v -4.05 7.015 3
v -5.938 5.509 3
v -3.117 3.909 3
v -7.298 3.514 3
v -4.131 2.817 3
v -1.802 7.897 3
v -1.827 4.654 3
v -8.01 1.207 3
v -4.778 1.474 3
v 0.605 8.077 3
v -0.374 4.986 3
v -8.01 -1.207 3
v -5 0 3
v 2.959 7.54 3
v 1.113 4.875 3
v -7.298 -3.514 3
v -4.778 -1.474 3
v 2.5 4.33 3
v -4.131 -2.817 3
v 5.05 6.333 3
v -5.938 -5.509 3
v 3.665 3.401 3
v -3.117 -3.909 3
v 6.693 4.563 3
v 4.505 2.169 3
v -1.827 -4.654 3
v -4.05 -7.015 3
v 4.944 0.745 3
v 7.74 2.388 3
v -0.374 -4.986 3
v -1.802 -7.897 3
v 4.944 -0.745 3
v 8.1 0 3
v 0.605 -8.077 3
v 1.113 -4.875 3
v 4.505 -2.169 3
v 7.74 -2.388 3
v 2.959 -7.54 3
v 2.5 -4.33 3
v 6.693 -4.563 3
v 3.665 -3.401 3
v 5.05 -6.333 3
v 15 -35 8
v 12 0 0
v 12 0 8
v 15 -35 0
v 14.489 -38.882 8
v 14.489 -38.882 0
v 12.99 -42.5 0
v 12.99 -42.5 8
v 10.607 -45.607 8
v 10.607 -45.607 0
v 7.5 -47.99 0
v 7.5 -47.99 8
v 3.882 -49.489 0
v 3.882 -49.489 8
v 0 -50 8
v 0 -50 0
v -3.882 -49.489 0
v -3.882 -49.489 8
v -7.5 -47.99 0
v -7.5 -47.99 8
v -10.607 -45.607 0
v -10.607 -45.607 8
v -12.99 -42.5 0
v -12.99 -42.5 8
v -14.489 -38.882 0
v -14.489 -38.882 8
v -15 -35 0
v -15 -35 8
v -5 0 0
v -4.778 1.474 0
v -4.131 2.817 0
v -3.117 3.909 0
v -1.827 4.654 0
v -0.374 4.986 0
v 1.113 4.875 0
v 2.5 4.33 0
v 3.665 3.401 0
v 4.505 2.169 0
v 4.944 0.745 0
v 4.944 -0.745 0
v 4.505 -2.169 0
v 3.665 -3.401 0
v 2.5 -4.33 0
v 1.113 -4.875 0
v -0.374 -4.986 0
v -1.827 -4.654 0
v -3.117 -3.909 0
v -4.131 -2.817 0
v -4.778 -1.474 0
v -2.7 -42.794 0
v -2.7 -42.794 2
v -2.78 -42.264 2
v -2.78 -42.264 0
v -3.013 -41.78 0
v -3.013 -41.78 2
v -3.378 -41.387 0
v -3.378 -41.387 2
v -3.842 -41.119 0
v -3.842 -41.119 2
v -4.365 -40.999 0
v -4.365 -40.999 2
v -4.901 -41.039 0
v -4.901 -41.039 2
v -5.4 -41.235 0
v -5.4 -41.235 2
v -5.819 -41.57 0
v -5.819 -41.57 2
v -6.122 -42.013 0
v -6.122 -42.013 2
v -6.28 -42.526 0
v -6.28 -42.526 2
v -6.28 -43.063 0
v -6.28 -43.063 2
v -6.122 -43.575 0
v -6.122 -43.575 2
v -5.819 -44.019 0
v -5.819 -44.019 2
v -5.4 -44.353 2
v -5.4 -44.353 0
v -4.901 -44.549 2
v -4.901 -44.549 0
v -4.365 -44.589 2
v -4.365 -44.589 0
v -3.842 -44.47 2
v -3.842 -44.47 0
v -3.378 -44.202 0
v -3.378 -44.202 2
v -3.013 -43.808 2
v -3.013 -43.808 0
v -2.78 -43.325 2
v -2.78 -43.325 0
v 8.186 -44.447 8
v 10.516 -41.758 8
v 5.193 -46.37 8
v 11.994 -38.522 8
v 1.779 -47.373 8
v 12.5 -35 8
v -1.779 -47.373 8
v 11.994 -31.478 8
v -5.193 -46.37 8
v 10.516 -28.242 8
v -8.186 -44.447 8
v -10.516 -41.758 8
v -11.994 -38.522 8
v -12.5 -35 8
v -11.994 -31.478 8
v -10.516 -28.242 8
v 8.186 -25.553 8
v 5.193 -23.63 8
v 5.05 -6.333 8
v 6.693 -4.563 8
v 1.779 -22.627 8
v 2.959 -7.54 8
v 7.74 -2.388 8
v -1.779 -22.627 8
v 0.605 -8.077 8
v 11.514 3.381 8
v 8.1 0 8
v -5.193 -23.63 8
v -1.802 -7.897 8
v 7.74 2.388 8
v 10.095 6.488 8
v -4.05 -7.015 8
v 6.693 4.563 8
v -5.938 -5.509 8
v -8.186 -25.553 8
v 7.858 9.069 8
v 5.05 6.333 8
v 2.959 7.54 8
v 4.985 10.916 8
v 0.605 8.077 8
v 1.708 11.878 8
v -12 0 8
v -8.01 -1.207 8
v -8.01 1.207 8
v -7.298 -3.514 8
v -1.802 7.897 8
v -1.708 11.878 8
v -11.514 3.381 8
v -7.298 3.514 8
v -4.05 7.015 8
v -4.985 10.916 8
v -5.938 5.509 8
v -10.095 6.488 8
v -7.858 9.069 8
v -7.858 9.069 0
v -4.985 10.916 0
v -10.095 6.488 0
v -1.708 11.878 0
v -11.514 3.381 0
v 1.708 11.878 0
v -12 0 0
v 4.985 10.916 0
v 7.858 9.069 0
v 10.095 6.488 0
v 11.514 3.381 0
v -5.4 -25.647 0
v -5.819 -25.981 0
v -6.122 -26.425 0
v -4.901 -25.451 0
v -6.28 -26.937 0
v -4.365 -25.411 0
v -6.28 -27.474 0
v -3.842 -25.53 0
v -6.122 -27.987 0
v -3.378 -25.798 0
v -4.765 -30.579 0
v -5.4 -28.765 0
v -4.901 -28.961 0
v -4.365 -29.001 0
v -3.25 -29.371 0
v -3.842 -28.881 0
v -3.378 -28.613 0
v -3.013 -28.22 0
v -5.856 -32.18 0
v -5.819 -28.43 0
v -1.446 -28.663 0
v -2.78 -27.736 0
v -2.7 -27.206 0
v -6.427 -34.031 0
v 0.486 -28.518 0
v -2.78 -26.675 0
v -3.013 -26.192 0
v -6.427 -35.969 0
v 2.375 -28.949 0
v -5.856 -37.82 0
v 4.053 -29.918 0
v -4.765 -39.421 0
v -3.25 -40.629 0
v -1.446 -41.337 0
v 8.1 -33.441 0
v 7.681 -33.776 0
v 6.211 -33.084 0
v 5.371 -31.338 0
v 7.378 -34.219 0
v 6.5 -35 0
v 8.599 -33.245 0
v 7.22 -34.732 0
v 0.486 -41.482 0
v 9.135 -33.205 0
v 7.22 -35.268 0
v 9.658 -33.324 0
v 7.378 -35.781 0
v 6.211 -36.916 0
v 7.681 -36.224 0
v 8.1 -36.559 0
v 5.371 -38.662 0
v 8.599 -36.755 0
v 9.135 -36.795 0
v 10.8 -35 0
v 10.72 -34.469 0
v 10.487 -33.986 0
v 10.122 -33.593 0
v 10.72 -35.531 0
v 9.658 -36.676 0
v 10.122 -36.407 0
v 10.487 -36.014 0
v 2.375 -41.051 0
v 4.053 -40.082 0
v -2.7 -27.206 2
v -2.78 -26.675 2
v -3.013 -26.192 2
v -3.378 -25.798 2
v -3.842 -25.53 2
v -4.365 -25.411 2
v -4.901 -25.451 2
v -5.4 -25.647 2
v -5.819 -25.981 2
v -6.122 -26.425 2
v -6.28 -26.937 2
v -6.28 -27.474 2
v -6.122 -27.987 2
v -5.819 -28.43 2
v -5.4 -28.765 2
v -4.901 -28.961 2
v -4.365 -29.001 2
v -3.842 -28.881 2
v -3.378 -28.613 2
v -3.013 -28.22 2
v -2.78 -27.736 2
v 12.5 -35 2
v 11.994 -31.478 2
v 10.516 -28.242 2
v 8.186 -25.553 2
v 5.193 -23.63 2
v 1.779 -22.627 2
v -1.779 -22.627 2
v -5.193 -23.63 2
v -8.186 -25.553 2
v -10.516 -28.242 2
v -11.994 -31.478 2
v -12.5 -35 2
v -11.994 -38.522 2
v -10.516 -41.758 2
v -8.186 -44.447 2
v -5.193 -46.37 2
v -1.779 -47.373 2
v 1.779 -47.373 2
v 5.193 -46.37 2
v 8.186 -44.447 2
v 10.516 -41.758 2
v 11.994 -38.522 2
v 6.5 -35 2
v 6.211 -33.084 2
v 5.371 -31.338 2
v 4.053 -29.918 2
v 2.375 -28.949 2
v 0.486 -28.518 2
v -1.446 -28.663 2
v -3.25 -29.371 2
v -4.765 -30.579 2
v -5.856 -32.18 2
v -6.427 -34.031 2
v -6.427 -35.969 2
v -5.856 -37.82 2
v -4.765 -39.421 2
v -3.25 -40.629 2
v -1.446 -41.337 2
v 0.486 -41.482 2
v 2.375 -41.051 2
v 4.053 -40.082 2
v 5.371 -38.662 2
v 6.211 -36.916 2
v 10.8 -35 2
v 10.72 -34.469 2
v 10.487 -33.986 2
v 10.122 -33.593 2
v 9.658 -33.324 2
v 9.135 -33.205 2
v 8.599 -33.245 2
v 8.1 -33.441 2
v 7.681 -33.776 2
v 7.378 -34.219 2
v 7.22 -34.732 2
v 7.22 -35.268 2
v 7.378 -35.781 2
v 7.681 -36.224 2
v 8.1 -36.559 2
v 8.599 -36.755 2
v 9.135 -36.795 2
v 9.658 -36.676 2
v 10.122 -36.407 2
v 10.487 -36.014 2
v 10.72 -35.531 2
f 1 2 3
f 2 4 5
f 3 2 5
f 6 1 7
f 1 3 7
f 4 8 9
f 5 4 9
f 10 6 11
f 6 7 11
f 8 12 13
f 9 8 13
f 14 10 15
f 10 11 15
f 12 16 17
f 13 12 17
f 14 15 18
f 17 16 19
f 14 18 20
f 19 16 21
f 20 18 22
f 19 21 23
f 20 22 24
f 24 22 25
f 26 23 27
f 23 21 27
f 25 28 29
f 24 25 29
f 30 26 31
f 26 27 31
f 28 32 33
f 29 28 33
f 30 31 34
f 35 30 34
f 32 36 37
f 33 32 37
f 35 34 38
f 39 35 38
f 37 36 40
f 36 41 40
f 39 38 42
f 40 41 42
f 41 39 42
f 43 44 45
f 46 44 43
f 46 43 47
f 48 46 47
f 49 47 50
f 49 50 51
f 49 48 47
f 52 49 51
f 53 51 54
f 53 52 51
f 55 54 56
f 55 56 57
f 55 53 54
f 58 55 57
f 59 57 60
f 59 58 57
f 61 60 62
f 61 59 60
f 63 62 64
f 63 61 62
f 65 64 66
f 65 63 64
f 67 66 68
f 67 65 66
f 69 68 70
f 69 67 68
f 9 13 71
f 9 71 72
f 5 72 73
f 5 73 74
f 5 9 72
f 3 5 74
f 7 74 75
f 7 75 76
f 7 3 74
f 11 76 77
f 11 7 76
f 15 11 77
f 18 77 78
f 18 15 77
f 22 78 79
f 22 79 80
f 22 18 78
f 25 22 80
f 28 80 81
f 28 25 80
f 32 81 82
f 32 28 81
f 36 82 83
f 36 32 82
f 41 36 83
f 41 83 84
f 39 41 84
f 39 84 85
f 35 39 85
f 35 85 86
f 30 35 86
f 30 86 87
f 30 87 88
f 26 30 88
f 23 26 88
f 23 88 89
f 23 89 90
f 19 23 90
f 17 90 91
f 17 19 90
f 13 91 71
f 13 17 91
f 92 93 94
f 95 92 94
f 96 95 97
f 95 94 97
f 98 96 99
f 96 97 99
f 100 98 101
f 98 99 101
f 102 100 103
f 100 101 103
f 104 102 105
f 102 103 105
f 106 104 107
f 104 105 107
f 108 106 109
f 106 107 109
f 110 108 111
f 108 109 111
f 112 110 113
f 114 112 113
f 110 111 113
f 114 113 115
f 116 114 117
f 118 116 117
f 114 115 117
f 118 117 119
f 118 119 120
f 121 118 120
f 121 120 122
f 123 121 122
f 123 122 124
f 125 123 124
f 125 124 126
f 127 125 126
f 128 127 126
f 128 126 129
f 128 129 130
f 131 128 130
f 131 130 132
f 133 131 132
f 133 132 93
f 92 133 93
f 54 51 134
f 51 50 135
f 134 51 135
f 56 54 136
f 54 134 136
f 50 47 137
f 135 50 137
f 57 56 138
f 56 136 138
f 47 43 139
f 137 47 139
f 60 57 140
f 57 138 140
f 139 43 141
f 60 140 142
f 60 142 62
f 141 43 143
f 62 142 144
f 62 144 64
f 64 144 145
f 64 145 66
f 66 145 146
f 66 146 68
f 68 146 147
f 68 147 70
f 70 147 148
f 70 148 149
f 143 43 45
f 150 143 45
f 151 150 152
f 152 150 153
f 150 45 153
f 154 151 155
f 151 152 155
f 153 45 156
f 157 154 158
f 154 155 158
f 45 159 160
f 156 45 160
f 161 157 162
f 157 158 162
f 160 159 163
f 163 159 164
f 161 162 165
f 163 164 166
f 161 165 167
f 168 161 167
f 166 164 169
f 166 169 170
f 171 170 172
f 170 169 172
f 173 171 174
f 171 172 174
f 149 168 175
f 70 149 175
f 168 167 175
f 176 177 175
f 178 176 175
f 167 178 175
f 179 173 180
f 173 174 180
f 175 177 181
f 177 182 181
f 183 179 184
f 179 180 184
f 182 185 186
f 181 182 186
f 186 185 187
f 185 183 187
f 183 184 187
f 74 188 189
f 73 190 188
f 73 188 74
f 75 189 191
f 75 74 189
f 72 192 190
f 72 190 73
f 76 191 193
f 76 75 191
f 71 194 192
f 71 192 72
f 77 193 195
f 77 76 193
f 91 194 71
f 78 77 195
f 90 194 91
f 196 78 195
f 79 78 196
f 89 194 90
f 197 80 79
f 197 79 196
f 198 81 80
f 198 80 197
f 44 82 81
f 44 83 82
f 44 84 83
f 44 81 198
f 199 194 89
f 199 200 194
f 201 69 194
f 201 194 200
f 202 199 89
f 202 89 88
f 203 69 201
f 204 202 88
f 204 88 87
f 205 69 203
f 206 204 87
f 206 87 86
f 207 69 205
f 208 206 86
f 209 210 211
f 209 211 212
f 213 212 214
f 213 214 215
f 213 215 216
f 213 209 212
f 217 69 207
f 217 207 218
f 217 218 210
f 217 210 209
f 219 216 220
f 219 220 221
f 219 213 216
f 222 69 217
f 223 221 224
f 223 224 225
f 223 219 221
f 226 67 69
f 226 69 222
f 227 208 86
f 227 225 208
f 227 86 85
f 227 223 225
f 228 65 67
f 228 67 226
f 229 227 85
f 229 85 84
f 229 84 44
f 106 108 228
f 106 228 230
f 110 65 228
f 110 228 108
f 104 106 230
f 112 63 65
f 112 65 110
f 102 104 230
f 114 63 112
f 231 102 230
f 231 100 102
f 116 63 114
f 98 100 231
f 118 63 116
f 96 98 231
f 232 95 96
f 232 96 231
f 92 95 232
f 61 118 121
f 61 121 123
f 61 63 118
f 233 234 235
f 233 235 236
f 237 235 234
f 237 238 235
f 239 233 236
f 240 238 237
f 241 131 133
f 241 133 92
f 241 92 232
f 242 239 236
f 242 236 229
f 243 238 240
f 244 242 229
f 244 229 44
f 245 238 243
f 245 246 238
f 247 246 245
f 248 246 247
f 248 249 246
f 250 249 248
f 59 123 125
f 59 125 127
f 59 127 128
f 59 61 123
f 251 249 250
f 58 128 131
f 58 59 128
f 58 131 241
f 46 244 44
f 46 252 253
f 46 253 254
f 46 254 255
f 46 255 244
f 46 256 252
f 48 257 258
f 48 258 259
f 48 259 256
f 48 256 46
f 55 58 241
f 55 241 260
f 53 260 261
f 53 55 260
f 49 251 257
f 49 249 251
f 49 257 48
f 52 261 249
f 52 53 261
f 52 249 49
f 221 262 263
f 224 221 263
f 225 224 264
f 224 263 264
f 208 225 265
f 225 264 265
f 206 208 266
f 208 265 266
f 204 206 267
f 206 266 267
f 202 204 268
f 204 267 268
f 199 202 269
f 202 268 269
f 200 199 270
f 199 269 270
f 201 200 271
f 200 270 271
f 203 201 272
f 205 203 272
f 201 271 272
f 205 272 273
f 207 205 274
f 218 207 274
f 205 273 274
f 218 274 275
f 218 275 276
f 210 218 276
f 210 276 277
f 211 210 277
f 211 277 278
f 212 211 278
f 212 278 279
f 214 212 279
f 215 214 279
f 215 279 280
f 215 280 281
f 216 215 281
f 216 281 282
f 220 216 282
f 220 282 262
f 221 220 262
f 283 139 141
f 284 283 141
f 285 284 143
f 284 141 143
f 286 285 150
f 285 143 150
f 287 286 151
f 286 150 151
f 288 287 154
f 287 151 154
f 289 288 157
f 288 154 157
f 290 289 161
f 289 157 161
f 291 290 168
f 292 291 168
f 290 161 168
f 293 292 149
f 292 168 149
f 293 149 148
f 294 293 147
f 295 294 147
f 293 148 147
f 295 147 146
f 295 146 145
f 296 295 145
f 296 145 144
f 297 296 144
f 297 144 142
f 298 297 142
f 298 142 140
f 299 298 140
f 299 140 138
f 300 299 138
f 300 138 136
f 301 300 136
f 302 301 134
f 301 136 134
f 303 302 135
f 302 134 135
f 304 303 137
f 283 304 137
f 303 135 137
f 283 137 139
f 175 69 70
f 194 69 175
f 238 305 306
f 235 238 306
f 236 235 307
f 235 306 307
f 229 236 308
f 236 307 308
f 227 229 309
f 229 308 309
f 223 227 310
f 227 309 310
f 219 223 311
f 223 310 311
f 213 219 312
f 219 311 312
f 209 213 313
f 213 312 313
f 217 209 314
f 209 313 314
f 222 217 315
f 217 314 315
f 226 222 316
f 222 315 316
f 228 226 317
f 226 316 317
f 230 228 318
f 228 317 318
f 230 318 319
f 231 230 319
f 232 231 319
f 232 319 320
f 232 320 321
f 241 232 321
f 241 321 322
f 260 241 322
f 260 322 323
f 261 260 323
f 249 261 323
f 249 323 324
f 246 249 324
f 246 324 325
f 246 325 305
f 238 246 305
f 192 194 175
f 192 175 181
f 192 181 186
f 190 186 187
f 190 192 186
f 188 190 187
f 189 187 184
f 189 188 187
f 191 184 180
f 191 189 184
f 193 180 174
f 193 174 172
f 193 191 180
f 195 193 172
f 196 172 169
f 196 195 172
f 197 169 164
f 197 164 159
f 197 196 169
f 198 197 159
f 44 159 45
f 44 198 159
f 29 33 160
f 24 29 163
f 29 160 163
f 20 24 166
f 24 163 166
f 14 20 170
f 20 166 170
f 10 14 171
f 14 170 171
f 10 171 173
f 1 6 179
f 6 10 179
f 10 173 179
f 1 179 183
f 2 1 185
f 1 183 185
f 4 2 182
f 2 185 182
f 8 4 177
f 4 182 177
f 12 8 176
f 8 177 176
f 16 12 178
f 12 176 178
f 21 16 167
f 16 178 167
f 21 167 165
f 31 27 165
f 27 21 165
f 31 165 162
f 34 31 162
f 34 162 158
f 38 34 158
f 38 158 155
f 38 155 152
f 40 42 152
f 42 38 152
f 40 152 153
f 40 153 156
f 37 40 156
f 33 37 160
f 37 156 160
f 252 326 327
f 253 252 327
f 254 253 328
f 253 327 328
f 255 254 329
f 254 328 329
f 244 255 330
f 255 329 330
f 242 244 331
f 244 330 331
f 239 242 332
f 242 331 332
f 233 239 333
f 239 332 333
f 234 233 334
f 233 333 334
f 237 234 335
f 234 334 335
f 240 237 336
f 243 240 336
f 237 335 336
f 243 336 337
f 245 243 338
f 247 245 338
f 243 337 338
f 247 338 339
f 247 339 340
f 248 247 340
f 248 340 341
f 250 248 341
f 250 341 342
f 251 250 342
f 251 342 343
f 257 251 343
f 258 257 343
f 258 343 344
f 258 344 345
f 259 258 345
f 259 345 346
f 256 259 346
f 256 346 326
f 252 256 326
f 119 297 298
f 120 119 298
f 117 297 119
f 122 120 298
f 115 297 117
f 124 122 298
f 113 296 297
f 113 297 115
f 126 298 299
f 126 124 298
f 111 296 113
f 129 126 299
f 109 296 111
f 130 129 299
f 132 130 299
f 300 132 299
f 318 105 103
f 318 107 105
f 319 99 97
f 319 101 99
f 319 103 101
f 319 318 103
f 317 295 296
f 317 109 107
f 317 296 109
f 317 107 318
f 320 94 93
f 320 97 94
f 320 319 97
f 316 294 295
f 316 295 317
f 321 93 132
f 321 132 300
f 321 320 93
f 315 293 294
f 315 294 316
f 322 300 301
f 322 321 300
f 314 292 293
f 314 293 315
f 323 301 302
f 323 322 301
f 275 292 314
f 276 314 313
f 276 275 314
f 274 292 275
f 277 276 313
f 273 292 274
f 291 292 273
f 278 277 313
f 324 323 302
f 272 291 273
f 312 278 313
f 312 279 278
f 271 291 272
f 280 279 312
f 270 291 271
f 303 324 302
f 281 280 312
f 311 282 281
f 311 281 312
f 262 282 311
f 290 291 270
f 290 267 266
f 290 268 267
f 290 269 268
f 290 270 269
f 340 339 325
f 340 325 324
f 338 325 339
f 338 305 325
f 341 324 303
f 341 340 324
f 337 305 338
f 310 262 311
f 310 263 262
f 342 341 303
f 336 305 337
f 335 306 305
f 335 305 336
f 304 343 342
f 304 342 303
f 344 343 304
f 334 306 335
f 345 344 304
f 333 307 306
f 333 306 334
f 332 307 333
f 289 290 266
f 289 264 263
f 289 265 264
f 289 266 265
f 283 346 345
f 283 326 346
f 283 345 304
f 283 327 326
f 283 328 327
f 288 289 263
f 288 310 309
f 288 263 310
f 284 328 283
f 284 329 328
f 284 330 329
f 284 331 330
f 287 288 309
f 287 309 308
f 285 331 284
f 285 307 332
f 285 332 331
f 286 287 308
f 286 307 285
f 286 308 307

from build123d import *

# Parameters (mm, degrees)
BOSS_EXTRU_1_DEPTH      = 8
ESQUISSE2_R             = 6.5
ENL_V_MAT_EXTRU_1_DEPTH = 10
ESQUISSE3_R             = 1.8
ENL_V_MAT_EXTRU_2_DEPTH = 10
ESQUISSE5_R             = 12.5
ENL_V_MAT_EXTRU_5_DEPTH = 6
ESQUISSE19_R            = 8.1
ENL_V_MAT_EXTRU_6_DEPTH = 10
BOSS_EXTRU_2_START      = -3
ESQUISSE22_R            = 8.1
ESQUISSE22_R_2          = 5
BOSS_EXTRU_2_DEPTH      = 3


with BuildPart() as part:
    # Esquisse1 → Boss.-Extru.1 (new body)
    with BuildSketch(Plane.XY):
        with BuildLine():
            Line((12, 0), (15, -35))
            ThreePointArc((15, -35), (0, -50), (-15, -35))
            Line((-15, -35), (-12, 0))
            ThreePointArc((-12, 0), (0, 12), (12, 0))
        make_face()
    extrude(amount=BOSS_EXTRU_1_DEPTH)

    # Esquisse2 → Enlèv. mat.-Extru.1 (cut)
    with BuildSketch(Plane.XY.offset(8)):
        with Locations((0, -35)):
            Circle(ESQUISSE2_R)
    extrude(amount=-ENL_V_MAT_EXTRU_1_DEPTH, mode=Mode.SUBTRACT)

    # Esquisse3 → Enlèv. mat.-Extru.2 (cut)
    with BuildSketch(Plane.XY.offset(8)):
        with Locations((9, -35)):
            Circle(ESQUISSE3_R)
        with Locations((-4.5, -27.205771366)):
            Circle(ESQUISSE3_R)
        with Locations((-4.5, -42.794228634)):
            Circle(ESQUISSE3_R)
    extrude(amount=-ENL_V_MAT_EXTRU_2_DEPTH, mode=Mode.SUBTRACT)

    # Esquisse5 → Enlèv. mat.-Extru.5 (cut)
    with BuildSketch(Plane.XY.offset(8)):
        with Locations((0, -35)):
            Circle(ESQUISSE5_R)
    extrude(amount=-ENL_V_MAT_EXTRU_5_DEPTH, mode=Mode.SUBTRACT)

    # Esquisse19 → Enlèv. mat.-Extru.6 (cut)
    with BuildSketch(Plane.XY.offset(8)):
        Circle(ESQUISSE19_R)
    extrude(amount=-ENL_V_MAT_EXTRU_6_DEPTH, mode=Mode.SUBTRACT)

    # Esquisse22 → Boss.-Extru.2 (add)
    with BuildSketch(Plane(origin=(0, 0, 0), x_dir=(-1, 0, 0), z_dir=(0, 0, -1)).offset(BOSS_EXTRU_2_START)):
        with Locations(Location((0, 0, 0), (0, 0, 180))):
            Circle(ESQUISSE22_R)
        Circle(ESQUISSE22_R_2, mode=Mode.SUBTRACT)
    extrude(amount=BOSS_EXTRU_2_DEPTH)


solid = part.part
